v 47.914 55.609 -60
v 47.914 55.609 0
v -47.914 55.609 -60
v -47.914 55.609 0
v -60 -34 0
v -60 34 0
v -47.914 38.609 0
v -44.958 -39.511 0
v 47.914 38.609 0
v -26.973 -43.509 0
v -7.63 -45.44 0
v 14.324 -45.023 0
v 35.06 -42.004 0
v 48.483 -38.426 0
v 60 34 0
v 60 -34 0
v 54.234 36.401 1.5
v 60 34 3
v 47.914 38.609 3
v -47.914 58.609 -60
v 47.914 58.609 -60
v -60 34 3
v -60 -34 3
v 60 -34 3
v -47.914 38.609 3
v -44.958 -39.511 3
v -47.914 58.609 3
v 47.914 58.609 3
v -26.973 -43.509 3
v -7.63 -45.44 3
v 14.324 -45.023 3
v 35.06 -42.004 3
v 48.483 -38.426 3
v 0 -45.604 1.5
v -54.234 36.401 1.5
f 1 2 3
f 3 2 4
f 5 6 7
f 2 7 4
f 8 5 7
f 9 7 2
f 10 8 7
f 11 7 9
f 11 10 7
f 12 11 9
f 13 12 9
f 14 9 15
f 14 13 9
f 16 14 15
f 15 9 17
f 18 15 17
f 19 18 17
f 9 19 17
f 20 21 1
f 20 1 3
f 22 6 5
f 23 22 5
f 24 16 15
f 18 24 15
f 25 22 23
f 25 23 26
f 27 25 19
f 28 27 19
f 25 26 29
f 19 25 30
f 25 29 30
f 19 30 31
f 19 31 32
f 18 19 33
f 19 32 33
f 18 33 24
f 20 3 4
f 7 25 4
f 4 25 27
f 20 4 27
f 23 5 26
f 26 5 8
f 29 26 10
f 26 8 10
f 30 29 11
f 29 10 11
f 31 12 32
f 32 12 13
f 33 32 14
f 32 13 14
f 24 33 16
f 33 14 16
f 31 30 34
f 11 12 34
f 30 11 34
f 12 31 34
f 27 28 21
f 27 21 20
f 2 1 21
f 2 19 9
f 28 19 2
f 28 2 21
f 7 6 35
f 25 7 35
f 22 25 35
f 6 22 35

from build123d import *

# Parameters (mm, degrees)
EXTRUDE_1_DEPTH           = 3
CUT_EXTRUDE_10_DEPTH      = 76.423640864
CUT_EXTRUDE_10_DEPTH_BACK = 3
SKETCH_9_W                = 95.828885904
SKETCH_9_H                = 3
EXTRUDE_2_DEPTH           = 20
SKETCH_10_W               = 95.828885904
SKETCH_10_H               = 3
EXTRUDE_3_DEPTH           = 60


with BuildPart() as part:
    # 草图1 → 凸台-拉伸1 (new body)
    with BuildSketch(Plane.XY):
        with BuildLine():
            Line((-60, 34), (-60, -34))
            add(Edge.make_bspline(
                [(-60, -34), (0, -61.168399395), (60, -34)],
                knots=[0.841357477, 0.841357477, 0.841357477, 2.300235176, 2.300235176, 2.300235176], degree=2, weights=[1, 0.745548499, 1]))
            Line((60, -34), (60, 34))
            add(Edge.make_bspline(
                [(60, 34), (0, 61.168399395), (-60, 34)],
                knots=[3.982950131, 3.982950131, 3.982950131, 5.44182783, 5.44182783, 5.44182783], degree=2, weights=[1, 0.745548499, 1]))
        make_face()
    extrude(amount=EXTRUDE_1_DEPTH)

    # 草图7 → 切除-拉伸10 (cut, two sides: drawn at the far end of the back side and taken through both)
    with BuildSketch(Plane(origin=(0, 0, 0), x_dir=(-1, 0, 0), z_dir=(0, 0, -1)).offset(-CUT_EXTRUDE_10_DEPTH_BACK)):
        with BuildLine():
            Line((-47.914442952, 38.608895735), (-0.047490379, 38.608895735))
            Line((-0.047490379, 38.608895735), (47.914442952, 38.608895735))
            add(Edge.make_bspline(
                [(-47.914442952, 38.608895735), (0, 53.86648698), (47.914442952, 38.608895735)],
                knots=[4.161758339, 4.161758339, 4.161758339, 5.263019622, 5.263019622, 5.263019622], degree=2, weights=[0.945270908, 0.800277591, 0.945270908]))
        make_face()
    extrude(amount=CUT_EXTRUDE_10_DEPTH + CUT_EXTRUDE_10_DEPTH_BACK, mode=Mode.SUBTRACT)

    # 草图9 → 凸台-拉伸2 (add)
    with BuildSketch(Plane(origin=(0, 38.608895735, 0), x_dir=(1, 0, 0), z_dir=(0, 1, 0))):
        with Locations((0, -1.5)):
            Rectangle(SKETCH_9_W, SKETCH_9_H)
    extrude(amount=EXTRUDE_2_DEPTH)

    # 草图10 → 凸台-拉伸3 (add)
    with BuildSketch(Plane(origin=(0, 0, 0), x_dir=(-1, 0, 0), z_dir=(0, 0, -1))):
        with Locations((0, 57.108895735)):
            Rectangle(SKETCH_10_W, SKETCH_10_H)
    extrude(amount=EXTRUDE_3_DEPTH)


solid = part.part
